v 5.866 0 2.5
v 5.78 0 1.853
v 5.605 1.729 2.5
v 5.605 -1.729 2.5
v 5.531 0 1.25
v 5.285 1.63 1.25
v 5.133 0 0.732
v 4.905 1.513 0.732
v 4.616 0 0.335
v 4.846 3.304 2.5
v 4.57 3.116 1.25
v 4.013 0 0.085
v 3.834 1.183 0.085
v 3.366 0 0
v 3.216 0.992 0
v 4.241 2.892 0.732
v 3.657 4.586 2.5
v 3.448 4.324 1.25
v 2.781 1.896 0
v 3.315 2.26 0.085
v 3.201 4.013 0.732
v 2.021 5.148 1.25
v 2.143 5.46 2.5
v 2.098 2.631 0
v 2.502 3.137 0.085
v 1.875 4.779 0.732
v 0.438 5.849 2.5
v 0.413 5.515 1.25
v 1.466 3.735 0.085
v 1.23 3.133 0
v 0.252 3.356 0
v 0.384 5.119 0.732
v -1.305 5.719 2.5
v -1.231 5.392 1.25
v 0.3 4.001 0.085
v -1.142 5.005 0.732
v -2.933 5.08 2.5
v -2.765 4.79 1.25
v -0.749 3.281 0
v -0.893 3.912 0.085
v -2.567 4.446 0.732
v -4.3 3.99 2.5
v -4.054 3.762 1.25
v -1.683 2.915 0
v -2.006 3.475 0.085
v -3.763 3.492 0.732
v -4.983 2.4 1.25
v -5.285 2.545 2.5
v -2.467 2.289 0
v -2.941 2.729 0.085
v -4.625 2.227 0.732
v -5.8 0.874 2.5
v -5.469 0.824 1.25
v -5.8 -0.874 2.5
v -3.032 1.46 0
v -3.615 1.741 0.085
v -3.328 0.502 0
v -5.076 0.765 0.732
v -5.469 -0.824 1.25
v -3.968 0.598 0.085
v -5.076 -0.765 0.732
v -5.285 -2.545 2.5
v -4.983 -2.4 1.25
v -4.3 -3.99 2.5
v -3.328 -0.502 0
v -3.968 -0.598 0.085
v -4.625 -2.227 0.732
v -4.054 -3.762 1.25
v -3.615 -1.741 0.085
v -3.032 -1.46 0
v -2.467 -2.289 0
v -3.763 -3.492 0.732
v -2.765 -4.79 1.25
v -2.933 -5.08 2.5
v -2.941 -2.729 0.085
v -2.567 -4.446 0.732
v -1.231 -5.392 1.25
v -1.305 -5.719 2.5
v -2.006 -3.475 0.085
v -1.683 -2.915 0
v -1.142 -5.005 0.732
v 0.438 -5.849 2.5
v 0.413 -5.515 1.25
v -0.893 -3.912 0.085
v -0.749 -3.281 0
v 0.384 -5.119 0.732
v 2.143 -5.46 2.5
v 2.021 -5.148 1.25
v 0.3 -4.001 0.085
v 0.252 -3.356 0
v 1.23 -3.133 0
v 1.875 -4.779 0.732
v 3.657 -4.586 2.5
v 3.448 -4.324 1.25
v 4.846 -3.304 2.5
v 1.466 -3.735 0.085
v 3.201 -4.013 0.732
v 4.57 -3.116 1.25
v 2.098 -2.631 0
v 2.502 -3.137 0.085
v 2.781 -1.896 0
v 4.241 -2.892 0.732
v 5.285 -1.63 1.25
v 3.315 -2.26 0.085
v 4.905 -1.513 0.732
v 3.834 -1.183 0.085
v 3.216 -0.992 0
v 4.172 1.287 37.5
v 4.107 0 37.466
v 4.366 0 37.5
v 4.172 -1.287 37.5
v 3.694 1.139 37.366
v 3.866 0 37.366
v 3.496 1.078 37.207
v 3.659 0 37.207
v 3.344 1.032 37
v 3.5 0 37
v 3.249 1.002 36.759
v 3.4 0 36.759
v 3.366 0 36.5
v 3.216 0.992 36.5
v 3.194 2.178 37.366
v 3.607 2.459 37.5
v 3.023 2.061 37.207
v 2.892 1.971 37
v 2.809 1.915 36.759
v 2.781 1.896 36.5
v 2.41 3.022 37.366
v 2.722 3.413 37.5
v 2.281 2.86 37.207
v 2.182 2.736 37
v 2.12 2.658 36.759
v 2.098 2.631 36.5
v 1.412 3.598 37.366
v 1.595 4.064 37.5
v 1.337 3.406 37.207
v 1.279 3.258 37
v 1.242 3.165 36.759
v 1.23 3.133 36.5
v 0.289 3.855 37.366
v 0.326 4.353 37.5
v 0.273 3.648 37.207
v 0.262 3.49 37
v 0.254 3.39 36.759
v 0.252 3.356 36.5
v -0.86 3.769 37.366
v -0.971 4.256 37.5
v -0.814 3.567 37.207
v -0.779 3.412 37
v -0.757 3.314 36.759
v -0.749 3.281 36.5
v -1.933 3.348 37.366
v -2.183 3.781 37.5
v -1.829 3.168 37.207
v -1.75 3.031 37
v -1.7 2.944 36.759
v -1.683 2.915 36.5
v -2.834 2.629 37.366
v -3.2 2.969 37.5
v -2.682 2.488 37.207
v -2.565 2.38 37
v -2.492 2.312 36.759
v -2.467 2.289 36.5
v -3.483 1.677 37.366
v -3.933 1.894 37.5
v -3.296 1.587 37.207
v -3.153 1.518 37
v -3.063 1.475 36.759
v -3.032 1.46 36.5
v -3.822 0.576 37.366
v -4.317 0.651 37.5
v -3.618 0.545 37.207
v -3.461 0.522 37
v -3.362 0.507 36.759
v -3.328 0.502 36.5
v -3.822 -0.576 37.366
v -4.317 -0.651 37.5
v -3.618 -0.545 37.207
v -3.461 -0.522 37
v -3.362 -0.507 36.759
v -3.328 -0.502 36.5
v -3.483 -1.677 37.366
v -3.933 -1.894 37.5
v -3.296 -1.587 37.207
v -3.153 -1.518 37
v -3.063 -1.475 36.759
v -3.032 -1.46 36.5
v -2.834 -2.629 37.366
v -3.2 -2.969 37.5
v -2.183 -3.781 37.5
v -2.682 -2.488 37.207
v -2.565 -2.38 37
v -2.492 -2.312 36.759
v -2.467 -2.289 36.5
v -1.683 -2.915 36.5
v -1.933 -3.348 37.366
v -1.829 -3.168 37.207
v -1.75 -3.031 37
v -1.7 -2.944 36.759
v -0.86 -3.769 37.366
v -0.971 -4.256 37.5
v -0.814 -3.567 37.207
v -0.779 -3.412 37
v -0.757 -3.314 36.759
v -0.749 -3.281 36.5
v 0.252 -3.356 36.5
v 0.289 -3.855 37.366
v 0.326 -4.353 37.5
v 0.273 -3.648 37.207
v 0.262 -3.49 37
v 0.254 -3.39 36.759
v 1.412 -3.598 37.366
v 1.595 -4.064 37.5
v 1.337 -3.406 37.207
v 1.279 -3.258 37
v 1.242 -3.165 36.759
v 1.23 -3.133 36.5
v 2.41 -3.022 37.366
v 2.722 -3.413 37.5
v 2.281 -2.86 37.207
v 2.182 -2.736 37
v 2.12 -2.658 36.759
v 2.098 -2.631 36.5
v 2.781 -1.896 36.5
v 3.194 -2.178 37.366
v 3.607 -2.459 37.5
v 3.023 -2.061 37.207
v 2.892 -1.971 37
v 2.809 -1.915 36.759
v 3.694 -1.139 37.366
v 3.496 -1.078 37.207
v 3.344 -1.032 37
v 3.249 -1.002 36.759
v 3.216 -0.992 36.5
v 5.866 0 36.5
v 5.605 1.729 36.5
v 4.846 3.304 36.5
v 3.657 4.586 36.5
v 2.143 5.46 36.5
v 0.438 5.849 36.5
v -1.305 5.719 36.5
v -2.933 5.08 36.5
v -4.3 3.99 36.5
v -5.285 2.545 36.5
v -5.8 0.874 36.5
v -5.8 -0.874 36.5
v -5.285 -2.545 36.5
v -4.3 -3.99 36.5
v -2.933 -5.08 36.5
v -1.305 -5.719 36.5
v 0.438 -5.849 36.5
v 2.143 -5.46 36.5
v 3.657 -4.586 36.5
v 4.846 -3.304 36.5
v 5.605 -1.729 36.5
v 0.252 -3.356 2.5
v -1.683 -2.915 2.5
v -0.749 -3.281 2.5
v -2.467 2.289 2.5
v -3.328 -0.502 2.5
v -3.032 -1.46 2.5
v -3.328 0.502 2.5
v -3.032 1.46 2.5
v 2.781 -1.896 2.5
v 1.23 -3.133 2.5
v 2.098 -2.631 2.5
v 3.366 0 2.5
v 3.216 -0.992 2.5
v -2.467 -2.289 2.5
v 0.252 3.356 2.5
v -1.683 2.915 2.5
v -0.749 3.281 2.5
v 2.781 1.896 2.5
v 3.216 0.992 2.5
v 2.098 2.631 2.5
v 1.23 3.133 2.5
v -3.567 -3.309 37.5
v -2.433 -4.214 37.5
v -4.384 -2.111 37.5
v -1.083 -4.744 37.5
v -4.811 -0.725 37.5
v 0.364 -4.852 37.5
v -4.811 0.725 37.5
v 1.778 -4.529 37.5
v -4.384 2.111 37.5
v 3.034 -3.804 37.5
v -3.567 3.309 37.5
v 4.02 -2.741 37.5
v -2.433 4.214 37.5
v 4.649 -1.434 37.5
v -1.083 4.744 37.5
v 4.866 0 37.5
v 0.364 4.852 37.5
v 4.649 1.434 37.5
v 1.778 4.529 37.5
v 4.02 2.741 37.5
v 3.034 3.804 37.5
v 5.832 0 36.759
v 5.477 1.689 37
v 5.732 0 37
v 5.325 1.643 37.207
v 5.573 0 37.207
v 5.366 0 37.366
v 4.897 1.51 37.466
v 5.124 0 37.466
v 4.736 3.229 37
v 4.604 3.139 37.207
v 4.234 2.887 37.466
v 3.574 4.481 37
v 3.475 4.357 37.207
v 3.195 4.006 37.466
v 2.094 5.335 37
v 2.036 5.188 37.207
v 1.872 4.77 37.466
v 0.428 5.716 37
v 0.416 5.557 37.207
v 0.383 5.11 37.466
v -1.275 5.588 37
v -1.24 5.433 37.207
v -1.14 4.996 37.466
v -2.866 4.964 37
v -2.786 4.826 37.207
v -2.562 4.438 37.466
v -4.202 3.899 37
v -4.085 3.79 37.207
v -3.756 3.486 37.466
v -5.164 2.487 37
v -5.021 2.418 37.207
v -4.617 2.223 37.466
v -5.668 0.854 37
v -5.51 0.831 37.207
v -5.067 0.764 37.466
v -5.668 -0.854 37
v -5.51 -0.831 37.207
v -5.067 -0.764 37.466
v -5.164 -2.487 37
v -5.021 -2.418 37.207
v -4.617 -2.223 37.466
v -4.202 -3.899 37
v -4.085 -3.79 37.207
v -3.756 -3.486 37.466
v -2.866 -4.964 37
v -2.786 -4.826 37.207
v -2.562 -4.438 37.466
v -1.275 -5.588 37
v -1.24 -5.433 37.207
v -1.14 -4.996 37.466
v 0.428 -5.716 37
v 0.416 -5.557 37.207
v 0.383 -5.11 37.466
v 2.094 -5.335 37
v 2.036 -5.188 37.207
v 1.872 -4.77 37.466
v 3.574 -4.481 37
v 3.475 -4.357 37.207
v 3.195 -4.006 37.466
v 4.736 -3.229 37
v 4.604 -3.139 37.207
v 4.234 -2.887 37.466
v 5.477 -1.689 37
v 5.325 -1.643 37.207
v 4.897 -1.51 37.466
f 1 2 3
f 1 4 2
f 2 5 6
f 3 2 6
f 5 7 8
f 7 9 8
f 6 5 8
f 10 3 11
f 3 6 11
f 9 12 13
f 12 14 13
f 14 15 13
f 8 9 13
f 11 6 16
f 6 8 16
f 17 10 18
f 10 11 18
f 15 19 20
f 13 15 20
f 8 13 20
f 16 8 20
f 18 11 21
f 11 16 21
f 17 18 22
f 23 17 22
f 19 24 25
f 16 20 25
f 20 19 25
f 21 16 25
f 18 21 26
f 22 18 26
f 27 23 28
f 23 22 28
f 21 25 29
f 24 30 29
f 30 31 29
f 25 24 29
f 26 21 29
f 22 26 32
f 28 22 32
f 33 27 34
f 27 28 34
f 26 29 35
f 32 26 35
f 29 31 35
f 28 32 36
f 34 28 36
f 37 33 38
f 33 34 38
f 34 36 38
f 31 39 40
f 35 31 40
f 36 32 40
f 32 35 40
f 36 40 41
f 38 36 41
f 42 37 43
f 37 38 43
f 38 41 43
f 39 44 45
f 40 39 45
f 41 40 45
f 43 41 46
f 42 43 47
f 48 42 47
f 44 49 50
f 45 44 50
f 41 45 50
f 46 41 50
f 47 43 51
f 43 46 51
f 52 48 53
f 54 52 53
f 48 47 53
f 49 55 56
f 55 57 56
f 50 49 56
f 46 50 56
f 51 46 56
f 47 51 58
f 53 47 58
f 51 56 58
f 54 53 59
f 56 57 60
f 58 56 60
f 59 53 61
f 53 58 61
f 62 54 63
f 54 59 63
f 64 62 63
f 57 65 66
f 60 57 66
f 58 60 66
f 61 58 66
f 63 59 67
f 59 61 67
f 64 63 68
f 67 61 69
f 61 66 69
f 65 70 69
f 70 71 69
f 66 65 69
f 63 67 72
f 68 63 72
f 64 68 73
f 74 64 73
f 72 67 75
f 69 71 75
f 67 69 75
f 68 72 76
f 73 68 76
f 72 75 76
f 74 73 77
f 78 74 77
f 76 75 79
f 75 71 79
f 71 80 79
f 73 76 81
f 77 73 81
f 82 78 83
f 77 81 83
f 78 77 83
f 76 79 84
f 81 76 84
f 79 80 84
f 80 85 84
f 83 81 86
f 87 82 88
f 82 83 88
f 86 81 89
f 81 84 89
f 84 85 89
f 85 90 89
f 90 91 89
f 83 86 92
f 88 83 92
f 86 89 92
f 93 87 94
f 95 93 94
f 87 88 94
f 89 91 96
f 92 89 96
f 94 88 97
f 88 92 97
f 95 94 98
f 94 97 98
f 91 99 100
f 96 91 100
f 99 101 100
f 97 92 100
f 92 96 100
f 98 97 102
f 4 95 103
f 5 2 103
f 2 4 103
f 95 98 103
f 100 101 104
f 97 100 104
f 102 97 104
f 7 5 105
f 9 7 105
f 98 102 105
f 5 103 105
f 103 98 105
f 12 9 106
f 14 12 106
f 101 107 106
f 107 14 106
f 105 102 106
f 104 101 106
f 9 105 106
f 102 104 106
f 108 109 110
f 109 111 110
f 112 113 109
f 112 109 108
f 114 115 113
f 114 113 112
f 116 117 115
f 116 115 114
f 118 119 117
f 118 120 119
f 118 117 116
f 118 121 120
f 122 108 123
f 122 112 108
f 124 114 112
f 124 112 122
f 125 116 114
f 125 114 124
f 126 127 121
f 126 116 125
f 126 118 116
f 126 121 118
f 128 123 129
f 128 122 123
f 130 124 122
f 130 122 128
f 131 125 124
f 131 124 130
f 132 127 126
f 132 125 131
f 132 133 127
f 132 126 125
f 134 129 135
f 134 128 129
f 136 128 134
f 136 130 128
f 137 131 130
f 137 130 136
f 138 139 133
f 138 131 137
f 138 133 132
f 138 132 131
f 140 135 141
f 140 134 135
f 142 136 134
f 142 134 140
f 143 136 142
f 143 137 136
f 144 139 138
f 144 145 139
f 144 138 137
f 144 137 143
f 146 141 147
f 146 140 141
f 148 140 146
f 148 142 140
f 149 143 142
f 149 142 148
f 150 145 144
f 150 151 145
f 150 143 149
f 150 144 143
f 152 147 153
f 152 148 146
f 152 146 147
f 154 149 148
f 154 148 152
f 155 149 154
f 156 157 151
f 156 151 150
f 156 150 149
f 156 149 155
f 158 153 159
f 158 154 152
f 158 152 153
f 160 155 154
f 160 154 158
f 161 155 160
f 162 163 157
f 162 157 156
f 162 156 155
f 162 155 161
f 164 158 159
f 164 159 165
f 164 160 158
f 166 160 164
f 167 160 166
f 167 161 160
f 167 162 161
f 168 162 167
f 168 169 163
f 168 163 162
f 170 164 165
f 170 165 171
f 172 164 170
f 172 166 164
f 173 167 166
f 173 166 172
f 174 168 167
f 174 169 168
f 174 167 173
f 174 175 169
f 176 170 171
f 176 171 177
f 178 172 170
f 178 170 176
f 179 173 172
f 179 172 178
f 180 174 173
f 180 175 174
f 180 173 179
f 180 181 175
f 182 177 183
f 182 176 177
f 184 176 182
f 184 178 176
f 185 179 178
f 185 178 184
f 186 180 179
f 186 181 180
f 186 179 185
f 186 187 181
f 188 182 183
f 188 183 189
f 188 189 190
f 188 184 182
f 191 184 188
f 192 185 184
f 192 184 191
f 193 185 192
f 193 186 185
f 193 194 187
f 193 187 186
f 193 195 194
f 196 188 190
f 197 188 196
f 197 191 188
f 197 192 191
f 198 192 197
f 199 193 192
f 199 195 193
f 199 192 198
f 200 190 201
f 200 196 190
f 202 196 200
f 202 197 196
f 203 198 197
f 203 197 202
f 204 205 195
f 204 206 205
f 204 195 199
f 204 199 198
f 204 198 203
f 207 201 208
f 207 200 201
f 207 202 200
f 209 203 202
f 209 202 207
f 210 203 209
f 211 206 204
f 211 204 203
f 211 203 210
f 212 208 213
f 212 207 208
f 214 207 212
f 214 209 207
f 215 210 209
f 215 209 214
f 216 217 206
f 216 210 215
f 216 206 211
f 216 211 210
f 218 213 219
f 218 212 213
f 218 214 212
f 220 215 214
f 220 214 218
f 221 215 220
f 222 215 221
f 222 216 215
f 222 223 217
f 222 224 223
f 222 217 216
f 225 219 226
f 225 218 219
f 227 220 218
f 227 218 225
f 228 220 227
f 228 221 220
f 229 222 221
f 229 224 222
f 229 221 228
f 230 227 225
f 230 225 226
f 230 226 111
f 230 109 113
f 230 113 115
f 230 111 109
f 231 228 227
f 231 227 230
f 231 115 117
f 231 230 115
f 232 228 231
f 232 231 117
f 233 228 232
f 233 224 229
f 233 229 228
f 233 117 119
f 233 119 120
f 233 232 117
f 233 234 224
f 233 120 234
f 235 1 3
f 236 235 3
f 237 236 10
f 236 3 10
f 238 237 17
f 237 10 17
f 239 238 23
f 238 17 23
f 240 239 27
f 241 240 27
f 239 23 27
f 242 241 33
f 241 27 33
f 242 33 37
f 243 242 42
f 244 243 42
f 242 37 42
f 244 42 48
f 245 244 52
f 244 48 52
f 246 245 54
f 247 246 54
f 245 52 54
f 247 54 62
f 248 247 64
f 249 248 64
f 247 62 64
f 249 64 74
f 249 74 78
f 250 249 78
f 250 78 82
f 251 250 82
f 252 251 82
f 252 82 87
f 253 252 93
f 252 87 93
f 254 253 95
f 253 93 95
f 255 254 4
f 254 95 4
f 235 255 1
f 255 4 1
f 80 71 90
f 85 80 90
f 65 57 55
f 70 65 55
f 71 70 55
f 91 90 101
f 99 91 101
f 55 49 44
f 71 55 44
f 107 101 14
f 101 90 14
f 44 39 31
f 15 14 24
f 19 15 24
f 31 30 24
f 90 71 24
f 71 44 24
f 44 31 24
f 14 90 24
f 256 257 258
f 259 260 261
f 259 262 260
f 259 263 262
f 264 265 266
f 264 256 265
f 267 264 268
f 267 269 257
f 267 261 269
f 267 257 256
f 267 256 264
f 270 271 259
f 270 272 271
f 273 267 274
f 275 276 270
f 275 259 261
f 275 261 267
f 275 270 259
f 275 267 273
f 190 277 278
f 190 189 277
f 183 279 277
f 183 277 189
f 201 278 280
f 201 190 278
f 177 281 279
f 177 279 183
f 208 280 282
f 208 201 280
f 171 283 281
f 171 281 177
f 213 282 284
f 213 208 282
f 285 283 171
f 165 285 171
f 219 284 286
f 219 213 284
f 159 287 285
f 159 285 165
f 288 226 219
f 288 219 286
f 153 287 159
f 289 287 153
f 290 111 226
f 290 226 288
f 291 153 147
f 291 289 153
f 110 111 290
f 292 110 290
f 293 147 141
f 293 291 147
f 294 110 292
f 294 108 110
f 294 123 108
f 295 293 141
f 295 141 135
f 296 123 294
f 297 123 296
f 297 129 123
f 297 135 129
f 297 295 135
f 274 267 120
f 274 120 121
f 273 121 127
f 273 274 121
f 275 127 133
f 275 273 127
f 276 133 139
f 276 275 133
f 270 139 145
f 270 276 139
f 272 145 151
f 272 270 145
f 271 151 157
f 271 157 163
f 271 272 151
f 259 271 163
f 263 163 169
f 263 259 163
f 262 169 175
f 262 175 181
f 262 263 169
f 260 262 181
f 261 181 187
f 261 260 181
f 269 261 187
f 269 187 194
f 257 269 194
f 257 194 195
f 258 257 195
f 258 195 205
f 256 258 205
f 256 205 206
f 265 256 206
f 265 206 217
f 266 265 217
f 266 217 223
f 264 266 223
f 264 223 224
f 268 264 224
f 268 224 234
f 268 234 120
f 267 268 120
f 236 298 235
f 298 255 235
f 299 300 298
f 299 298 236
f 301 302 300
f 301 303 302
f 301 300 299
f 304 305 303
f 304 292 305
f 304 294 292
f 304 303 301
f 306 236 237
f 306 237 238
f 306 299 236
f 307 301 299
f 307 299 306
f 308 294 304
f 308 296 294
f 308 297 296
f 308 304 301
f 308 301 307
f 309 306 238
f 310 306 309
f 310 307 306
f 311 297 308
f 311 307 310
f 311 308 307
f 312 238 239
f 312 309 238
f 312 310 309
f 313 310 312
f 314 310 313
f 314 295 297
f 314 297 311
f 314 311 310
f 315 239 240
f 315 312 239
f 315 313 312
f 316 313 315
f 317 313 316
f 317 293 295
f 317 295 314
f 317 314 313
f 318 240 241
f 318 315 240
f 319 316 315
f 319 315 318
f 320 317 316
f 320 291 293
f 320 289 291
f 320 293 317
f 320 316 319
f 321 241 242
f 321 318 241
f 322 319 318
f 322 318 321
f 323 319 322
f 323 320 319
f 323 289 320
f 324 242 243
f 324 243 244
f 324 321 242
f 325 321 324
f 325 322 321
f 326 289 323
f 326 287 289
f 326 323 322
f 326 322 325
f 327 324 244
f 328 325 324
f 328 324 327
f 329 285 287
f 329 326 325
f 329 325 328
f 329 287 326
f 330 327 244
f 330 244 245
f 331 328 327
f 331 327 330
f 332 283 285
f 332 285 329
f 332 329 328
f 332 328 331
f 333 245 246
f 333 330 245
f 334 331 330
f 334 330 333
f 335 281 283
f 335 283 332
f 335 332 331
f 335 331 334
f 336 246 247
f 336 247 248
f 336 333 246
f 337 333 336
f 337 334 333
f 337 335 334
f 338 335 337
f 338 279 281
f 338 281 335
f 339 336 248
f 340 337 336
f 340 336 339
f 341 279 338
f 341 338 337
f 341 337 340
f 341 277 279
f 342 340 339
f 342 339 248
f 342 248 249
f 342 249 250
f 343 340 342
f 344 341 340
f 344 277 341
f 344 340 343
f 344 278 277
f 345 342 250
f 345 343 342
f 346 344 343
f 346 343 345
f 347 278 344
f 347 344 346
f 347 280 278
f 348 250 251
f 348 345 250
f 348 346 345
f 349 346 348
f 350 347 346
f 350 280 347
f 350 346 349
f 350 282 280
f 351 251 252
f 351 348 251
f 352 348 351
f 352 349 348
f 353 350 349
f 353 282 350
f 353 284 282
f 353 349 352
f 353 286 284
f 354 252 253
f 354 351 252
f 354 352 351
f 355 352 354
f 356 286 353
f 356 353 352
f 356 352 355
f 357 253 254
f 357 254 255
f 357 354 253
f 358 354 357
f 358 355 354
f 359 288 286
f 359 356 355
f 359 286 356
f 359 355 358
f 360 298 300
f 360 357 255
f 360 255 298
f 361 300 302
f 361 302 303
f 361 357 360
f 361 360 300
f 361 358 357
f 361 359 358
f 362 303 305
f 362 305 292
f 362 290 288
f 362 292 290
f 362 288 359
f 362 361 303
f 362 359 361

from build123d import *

# Parameters (mm, degrees)
F0_R     = 5.8656239377
F1_DEPTH = 37.5
F2_T     = -2.5
F3_R     = 2.5
F4_R     = 1


with BuildPart() as f1:
    # F0 (on Top) → F1 (new body)
    with BuildSketch(Plane.XY):
        Circle(F0_R)
    extrude(amount=F1_DEPTH)

    # F2
    f2_openings = [f1.faces().sort_by_distance(p)[0] for p in [
        (0, 0, 37.5),
    ]]
    offset(amount=F2_T, openings=f2_openings)

    # F3
    f3_edges = [f1.edges().sort_by_distance(p)[0] for p in [
        (-5.865624, 0, 0),
    ]]
    fillet(f3_edges, radius=F3_R)

    # F4
    f4_edges = [f1.edges().sort_by_distance(p)[0] for p in [
        (-5.865624, 0, 37.5),
        (-3.365624, 0, 37.5),
    ]]
    fillet(f4_edges, radius=F4_R)


solid = f1.part
